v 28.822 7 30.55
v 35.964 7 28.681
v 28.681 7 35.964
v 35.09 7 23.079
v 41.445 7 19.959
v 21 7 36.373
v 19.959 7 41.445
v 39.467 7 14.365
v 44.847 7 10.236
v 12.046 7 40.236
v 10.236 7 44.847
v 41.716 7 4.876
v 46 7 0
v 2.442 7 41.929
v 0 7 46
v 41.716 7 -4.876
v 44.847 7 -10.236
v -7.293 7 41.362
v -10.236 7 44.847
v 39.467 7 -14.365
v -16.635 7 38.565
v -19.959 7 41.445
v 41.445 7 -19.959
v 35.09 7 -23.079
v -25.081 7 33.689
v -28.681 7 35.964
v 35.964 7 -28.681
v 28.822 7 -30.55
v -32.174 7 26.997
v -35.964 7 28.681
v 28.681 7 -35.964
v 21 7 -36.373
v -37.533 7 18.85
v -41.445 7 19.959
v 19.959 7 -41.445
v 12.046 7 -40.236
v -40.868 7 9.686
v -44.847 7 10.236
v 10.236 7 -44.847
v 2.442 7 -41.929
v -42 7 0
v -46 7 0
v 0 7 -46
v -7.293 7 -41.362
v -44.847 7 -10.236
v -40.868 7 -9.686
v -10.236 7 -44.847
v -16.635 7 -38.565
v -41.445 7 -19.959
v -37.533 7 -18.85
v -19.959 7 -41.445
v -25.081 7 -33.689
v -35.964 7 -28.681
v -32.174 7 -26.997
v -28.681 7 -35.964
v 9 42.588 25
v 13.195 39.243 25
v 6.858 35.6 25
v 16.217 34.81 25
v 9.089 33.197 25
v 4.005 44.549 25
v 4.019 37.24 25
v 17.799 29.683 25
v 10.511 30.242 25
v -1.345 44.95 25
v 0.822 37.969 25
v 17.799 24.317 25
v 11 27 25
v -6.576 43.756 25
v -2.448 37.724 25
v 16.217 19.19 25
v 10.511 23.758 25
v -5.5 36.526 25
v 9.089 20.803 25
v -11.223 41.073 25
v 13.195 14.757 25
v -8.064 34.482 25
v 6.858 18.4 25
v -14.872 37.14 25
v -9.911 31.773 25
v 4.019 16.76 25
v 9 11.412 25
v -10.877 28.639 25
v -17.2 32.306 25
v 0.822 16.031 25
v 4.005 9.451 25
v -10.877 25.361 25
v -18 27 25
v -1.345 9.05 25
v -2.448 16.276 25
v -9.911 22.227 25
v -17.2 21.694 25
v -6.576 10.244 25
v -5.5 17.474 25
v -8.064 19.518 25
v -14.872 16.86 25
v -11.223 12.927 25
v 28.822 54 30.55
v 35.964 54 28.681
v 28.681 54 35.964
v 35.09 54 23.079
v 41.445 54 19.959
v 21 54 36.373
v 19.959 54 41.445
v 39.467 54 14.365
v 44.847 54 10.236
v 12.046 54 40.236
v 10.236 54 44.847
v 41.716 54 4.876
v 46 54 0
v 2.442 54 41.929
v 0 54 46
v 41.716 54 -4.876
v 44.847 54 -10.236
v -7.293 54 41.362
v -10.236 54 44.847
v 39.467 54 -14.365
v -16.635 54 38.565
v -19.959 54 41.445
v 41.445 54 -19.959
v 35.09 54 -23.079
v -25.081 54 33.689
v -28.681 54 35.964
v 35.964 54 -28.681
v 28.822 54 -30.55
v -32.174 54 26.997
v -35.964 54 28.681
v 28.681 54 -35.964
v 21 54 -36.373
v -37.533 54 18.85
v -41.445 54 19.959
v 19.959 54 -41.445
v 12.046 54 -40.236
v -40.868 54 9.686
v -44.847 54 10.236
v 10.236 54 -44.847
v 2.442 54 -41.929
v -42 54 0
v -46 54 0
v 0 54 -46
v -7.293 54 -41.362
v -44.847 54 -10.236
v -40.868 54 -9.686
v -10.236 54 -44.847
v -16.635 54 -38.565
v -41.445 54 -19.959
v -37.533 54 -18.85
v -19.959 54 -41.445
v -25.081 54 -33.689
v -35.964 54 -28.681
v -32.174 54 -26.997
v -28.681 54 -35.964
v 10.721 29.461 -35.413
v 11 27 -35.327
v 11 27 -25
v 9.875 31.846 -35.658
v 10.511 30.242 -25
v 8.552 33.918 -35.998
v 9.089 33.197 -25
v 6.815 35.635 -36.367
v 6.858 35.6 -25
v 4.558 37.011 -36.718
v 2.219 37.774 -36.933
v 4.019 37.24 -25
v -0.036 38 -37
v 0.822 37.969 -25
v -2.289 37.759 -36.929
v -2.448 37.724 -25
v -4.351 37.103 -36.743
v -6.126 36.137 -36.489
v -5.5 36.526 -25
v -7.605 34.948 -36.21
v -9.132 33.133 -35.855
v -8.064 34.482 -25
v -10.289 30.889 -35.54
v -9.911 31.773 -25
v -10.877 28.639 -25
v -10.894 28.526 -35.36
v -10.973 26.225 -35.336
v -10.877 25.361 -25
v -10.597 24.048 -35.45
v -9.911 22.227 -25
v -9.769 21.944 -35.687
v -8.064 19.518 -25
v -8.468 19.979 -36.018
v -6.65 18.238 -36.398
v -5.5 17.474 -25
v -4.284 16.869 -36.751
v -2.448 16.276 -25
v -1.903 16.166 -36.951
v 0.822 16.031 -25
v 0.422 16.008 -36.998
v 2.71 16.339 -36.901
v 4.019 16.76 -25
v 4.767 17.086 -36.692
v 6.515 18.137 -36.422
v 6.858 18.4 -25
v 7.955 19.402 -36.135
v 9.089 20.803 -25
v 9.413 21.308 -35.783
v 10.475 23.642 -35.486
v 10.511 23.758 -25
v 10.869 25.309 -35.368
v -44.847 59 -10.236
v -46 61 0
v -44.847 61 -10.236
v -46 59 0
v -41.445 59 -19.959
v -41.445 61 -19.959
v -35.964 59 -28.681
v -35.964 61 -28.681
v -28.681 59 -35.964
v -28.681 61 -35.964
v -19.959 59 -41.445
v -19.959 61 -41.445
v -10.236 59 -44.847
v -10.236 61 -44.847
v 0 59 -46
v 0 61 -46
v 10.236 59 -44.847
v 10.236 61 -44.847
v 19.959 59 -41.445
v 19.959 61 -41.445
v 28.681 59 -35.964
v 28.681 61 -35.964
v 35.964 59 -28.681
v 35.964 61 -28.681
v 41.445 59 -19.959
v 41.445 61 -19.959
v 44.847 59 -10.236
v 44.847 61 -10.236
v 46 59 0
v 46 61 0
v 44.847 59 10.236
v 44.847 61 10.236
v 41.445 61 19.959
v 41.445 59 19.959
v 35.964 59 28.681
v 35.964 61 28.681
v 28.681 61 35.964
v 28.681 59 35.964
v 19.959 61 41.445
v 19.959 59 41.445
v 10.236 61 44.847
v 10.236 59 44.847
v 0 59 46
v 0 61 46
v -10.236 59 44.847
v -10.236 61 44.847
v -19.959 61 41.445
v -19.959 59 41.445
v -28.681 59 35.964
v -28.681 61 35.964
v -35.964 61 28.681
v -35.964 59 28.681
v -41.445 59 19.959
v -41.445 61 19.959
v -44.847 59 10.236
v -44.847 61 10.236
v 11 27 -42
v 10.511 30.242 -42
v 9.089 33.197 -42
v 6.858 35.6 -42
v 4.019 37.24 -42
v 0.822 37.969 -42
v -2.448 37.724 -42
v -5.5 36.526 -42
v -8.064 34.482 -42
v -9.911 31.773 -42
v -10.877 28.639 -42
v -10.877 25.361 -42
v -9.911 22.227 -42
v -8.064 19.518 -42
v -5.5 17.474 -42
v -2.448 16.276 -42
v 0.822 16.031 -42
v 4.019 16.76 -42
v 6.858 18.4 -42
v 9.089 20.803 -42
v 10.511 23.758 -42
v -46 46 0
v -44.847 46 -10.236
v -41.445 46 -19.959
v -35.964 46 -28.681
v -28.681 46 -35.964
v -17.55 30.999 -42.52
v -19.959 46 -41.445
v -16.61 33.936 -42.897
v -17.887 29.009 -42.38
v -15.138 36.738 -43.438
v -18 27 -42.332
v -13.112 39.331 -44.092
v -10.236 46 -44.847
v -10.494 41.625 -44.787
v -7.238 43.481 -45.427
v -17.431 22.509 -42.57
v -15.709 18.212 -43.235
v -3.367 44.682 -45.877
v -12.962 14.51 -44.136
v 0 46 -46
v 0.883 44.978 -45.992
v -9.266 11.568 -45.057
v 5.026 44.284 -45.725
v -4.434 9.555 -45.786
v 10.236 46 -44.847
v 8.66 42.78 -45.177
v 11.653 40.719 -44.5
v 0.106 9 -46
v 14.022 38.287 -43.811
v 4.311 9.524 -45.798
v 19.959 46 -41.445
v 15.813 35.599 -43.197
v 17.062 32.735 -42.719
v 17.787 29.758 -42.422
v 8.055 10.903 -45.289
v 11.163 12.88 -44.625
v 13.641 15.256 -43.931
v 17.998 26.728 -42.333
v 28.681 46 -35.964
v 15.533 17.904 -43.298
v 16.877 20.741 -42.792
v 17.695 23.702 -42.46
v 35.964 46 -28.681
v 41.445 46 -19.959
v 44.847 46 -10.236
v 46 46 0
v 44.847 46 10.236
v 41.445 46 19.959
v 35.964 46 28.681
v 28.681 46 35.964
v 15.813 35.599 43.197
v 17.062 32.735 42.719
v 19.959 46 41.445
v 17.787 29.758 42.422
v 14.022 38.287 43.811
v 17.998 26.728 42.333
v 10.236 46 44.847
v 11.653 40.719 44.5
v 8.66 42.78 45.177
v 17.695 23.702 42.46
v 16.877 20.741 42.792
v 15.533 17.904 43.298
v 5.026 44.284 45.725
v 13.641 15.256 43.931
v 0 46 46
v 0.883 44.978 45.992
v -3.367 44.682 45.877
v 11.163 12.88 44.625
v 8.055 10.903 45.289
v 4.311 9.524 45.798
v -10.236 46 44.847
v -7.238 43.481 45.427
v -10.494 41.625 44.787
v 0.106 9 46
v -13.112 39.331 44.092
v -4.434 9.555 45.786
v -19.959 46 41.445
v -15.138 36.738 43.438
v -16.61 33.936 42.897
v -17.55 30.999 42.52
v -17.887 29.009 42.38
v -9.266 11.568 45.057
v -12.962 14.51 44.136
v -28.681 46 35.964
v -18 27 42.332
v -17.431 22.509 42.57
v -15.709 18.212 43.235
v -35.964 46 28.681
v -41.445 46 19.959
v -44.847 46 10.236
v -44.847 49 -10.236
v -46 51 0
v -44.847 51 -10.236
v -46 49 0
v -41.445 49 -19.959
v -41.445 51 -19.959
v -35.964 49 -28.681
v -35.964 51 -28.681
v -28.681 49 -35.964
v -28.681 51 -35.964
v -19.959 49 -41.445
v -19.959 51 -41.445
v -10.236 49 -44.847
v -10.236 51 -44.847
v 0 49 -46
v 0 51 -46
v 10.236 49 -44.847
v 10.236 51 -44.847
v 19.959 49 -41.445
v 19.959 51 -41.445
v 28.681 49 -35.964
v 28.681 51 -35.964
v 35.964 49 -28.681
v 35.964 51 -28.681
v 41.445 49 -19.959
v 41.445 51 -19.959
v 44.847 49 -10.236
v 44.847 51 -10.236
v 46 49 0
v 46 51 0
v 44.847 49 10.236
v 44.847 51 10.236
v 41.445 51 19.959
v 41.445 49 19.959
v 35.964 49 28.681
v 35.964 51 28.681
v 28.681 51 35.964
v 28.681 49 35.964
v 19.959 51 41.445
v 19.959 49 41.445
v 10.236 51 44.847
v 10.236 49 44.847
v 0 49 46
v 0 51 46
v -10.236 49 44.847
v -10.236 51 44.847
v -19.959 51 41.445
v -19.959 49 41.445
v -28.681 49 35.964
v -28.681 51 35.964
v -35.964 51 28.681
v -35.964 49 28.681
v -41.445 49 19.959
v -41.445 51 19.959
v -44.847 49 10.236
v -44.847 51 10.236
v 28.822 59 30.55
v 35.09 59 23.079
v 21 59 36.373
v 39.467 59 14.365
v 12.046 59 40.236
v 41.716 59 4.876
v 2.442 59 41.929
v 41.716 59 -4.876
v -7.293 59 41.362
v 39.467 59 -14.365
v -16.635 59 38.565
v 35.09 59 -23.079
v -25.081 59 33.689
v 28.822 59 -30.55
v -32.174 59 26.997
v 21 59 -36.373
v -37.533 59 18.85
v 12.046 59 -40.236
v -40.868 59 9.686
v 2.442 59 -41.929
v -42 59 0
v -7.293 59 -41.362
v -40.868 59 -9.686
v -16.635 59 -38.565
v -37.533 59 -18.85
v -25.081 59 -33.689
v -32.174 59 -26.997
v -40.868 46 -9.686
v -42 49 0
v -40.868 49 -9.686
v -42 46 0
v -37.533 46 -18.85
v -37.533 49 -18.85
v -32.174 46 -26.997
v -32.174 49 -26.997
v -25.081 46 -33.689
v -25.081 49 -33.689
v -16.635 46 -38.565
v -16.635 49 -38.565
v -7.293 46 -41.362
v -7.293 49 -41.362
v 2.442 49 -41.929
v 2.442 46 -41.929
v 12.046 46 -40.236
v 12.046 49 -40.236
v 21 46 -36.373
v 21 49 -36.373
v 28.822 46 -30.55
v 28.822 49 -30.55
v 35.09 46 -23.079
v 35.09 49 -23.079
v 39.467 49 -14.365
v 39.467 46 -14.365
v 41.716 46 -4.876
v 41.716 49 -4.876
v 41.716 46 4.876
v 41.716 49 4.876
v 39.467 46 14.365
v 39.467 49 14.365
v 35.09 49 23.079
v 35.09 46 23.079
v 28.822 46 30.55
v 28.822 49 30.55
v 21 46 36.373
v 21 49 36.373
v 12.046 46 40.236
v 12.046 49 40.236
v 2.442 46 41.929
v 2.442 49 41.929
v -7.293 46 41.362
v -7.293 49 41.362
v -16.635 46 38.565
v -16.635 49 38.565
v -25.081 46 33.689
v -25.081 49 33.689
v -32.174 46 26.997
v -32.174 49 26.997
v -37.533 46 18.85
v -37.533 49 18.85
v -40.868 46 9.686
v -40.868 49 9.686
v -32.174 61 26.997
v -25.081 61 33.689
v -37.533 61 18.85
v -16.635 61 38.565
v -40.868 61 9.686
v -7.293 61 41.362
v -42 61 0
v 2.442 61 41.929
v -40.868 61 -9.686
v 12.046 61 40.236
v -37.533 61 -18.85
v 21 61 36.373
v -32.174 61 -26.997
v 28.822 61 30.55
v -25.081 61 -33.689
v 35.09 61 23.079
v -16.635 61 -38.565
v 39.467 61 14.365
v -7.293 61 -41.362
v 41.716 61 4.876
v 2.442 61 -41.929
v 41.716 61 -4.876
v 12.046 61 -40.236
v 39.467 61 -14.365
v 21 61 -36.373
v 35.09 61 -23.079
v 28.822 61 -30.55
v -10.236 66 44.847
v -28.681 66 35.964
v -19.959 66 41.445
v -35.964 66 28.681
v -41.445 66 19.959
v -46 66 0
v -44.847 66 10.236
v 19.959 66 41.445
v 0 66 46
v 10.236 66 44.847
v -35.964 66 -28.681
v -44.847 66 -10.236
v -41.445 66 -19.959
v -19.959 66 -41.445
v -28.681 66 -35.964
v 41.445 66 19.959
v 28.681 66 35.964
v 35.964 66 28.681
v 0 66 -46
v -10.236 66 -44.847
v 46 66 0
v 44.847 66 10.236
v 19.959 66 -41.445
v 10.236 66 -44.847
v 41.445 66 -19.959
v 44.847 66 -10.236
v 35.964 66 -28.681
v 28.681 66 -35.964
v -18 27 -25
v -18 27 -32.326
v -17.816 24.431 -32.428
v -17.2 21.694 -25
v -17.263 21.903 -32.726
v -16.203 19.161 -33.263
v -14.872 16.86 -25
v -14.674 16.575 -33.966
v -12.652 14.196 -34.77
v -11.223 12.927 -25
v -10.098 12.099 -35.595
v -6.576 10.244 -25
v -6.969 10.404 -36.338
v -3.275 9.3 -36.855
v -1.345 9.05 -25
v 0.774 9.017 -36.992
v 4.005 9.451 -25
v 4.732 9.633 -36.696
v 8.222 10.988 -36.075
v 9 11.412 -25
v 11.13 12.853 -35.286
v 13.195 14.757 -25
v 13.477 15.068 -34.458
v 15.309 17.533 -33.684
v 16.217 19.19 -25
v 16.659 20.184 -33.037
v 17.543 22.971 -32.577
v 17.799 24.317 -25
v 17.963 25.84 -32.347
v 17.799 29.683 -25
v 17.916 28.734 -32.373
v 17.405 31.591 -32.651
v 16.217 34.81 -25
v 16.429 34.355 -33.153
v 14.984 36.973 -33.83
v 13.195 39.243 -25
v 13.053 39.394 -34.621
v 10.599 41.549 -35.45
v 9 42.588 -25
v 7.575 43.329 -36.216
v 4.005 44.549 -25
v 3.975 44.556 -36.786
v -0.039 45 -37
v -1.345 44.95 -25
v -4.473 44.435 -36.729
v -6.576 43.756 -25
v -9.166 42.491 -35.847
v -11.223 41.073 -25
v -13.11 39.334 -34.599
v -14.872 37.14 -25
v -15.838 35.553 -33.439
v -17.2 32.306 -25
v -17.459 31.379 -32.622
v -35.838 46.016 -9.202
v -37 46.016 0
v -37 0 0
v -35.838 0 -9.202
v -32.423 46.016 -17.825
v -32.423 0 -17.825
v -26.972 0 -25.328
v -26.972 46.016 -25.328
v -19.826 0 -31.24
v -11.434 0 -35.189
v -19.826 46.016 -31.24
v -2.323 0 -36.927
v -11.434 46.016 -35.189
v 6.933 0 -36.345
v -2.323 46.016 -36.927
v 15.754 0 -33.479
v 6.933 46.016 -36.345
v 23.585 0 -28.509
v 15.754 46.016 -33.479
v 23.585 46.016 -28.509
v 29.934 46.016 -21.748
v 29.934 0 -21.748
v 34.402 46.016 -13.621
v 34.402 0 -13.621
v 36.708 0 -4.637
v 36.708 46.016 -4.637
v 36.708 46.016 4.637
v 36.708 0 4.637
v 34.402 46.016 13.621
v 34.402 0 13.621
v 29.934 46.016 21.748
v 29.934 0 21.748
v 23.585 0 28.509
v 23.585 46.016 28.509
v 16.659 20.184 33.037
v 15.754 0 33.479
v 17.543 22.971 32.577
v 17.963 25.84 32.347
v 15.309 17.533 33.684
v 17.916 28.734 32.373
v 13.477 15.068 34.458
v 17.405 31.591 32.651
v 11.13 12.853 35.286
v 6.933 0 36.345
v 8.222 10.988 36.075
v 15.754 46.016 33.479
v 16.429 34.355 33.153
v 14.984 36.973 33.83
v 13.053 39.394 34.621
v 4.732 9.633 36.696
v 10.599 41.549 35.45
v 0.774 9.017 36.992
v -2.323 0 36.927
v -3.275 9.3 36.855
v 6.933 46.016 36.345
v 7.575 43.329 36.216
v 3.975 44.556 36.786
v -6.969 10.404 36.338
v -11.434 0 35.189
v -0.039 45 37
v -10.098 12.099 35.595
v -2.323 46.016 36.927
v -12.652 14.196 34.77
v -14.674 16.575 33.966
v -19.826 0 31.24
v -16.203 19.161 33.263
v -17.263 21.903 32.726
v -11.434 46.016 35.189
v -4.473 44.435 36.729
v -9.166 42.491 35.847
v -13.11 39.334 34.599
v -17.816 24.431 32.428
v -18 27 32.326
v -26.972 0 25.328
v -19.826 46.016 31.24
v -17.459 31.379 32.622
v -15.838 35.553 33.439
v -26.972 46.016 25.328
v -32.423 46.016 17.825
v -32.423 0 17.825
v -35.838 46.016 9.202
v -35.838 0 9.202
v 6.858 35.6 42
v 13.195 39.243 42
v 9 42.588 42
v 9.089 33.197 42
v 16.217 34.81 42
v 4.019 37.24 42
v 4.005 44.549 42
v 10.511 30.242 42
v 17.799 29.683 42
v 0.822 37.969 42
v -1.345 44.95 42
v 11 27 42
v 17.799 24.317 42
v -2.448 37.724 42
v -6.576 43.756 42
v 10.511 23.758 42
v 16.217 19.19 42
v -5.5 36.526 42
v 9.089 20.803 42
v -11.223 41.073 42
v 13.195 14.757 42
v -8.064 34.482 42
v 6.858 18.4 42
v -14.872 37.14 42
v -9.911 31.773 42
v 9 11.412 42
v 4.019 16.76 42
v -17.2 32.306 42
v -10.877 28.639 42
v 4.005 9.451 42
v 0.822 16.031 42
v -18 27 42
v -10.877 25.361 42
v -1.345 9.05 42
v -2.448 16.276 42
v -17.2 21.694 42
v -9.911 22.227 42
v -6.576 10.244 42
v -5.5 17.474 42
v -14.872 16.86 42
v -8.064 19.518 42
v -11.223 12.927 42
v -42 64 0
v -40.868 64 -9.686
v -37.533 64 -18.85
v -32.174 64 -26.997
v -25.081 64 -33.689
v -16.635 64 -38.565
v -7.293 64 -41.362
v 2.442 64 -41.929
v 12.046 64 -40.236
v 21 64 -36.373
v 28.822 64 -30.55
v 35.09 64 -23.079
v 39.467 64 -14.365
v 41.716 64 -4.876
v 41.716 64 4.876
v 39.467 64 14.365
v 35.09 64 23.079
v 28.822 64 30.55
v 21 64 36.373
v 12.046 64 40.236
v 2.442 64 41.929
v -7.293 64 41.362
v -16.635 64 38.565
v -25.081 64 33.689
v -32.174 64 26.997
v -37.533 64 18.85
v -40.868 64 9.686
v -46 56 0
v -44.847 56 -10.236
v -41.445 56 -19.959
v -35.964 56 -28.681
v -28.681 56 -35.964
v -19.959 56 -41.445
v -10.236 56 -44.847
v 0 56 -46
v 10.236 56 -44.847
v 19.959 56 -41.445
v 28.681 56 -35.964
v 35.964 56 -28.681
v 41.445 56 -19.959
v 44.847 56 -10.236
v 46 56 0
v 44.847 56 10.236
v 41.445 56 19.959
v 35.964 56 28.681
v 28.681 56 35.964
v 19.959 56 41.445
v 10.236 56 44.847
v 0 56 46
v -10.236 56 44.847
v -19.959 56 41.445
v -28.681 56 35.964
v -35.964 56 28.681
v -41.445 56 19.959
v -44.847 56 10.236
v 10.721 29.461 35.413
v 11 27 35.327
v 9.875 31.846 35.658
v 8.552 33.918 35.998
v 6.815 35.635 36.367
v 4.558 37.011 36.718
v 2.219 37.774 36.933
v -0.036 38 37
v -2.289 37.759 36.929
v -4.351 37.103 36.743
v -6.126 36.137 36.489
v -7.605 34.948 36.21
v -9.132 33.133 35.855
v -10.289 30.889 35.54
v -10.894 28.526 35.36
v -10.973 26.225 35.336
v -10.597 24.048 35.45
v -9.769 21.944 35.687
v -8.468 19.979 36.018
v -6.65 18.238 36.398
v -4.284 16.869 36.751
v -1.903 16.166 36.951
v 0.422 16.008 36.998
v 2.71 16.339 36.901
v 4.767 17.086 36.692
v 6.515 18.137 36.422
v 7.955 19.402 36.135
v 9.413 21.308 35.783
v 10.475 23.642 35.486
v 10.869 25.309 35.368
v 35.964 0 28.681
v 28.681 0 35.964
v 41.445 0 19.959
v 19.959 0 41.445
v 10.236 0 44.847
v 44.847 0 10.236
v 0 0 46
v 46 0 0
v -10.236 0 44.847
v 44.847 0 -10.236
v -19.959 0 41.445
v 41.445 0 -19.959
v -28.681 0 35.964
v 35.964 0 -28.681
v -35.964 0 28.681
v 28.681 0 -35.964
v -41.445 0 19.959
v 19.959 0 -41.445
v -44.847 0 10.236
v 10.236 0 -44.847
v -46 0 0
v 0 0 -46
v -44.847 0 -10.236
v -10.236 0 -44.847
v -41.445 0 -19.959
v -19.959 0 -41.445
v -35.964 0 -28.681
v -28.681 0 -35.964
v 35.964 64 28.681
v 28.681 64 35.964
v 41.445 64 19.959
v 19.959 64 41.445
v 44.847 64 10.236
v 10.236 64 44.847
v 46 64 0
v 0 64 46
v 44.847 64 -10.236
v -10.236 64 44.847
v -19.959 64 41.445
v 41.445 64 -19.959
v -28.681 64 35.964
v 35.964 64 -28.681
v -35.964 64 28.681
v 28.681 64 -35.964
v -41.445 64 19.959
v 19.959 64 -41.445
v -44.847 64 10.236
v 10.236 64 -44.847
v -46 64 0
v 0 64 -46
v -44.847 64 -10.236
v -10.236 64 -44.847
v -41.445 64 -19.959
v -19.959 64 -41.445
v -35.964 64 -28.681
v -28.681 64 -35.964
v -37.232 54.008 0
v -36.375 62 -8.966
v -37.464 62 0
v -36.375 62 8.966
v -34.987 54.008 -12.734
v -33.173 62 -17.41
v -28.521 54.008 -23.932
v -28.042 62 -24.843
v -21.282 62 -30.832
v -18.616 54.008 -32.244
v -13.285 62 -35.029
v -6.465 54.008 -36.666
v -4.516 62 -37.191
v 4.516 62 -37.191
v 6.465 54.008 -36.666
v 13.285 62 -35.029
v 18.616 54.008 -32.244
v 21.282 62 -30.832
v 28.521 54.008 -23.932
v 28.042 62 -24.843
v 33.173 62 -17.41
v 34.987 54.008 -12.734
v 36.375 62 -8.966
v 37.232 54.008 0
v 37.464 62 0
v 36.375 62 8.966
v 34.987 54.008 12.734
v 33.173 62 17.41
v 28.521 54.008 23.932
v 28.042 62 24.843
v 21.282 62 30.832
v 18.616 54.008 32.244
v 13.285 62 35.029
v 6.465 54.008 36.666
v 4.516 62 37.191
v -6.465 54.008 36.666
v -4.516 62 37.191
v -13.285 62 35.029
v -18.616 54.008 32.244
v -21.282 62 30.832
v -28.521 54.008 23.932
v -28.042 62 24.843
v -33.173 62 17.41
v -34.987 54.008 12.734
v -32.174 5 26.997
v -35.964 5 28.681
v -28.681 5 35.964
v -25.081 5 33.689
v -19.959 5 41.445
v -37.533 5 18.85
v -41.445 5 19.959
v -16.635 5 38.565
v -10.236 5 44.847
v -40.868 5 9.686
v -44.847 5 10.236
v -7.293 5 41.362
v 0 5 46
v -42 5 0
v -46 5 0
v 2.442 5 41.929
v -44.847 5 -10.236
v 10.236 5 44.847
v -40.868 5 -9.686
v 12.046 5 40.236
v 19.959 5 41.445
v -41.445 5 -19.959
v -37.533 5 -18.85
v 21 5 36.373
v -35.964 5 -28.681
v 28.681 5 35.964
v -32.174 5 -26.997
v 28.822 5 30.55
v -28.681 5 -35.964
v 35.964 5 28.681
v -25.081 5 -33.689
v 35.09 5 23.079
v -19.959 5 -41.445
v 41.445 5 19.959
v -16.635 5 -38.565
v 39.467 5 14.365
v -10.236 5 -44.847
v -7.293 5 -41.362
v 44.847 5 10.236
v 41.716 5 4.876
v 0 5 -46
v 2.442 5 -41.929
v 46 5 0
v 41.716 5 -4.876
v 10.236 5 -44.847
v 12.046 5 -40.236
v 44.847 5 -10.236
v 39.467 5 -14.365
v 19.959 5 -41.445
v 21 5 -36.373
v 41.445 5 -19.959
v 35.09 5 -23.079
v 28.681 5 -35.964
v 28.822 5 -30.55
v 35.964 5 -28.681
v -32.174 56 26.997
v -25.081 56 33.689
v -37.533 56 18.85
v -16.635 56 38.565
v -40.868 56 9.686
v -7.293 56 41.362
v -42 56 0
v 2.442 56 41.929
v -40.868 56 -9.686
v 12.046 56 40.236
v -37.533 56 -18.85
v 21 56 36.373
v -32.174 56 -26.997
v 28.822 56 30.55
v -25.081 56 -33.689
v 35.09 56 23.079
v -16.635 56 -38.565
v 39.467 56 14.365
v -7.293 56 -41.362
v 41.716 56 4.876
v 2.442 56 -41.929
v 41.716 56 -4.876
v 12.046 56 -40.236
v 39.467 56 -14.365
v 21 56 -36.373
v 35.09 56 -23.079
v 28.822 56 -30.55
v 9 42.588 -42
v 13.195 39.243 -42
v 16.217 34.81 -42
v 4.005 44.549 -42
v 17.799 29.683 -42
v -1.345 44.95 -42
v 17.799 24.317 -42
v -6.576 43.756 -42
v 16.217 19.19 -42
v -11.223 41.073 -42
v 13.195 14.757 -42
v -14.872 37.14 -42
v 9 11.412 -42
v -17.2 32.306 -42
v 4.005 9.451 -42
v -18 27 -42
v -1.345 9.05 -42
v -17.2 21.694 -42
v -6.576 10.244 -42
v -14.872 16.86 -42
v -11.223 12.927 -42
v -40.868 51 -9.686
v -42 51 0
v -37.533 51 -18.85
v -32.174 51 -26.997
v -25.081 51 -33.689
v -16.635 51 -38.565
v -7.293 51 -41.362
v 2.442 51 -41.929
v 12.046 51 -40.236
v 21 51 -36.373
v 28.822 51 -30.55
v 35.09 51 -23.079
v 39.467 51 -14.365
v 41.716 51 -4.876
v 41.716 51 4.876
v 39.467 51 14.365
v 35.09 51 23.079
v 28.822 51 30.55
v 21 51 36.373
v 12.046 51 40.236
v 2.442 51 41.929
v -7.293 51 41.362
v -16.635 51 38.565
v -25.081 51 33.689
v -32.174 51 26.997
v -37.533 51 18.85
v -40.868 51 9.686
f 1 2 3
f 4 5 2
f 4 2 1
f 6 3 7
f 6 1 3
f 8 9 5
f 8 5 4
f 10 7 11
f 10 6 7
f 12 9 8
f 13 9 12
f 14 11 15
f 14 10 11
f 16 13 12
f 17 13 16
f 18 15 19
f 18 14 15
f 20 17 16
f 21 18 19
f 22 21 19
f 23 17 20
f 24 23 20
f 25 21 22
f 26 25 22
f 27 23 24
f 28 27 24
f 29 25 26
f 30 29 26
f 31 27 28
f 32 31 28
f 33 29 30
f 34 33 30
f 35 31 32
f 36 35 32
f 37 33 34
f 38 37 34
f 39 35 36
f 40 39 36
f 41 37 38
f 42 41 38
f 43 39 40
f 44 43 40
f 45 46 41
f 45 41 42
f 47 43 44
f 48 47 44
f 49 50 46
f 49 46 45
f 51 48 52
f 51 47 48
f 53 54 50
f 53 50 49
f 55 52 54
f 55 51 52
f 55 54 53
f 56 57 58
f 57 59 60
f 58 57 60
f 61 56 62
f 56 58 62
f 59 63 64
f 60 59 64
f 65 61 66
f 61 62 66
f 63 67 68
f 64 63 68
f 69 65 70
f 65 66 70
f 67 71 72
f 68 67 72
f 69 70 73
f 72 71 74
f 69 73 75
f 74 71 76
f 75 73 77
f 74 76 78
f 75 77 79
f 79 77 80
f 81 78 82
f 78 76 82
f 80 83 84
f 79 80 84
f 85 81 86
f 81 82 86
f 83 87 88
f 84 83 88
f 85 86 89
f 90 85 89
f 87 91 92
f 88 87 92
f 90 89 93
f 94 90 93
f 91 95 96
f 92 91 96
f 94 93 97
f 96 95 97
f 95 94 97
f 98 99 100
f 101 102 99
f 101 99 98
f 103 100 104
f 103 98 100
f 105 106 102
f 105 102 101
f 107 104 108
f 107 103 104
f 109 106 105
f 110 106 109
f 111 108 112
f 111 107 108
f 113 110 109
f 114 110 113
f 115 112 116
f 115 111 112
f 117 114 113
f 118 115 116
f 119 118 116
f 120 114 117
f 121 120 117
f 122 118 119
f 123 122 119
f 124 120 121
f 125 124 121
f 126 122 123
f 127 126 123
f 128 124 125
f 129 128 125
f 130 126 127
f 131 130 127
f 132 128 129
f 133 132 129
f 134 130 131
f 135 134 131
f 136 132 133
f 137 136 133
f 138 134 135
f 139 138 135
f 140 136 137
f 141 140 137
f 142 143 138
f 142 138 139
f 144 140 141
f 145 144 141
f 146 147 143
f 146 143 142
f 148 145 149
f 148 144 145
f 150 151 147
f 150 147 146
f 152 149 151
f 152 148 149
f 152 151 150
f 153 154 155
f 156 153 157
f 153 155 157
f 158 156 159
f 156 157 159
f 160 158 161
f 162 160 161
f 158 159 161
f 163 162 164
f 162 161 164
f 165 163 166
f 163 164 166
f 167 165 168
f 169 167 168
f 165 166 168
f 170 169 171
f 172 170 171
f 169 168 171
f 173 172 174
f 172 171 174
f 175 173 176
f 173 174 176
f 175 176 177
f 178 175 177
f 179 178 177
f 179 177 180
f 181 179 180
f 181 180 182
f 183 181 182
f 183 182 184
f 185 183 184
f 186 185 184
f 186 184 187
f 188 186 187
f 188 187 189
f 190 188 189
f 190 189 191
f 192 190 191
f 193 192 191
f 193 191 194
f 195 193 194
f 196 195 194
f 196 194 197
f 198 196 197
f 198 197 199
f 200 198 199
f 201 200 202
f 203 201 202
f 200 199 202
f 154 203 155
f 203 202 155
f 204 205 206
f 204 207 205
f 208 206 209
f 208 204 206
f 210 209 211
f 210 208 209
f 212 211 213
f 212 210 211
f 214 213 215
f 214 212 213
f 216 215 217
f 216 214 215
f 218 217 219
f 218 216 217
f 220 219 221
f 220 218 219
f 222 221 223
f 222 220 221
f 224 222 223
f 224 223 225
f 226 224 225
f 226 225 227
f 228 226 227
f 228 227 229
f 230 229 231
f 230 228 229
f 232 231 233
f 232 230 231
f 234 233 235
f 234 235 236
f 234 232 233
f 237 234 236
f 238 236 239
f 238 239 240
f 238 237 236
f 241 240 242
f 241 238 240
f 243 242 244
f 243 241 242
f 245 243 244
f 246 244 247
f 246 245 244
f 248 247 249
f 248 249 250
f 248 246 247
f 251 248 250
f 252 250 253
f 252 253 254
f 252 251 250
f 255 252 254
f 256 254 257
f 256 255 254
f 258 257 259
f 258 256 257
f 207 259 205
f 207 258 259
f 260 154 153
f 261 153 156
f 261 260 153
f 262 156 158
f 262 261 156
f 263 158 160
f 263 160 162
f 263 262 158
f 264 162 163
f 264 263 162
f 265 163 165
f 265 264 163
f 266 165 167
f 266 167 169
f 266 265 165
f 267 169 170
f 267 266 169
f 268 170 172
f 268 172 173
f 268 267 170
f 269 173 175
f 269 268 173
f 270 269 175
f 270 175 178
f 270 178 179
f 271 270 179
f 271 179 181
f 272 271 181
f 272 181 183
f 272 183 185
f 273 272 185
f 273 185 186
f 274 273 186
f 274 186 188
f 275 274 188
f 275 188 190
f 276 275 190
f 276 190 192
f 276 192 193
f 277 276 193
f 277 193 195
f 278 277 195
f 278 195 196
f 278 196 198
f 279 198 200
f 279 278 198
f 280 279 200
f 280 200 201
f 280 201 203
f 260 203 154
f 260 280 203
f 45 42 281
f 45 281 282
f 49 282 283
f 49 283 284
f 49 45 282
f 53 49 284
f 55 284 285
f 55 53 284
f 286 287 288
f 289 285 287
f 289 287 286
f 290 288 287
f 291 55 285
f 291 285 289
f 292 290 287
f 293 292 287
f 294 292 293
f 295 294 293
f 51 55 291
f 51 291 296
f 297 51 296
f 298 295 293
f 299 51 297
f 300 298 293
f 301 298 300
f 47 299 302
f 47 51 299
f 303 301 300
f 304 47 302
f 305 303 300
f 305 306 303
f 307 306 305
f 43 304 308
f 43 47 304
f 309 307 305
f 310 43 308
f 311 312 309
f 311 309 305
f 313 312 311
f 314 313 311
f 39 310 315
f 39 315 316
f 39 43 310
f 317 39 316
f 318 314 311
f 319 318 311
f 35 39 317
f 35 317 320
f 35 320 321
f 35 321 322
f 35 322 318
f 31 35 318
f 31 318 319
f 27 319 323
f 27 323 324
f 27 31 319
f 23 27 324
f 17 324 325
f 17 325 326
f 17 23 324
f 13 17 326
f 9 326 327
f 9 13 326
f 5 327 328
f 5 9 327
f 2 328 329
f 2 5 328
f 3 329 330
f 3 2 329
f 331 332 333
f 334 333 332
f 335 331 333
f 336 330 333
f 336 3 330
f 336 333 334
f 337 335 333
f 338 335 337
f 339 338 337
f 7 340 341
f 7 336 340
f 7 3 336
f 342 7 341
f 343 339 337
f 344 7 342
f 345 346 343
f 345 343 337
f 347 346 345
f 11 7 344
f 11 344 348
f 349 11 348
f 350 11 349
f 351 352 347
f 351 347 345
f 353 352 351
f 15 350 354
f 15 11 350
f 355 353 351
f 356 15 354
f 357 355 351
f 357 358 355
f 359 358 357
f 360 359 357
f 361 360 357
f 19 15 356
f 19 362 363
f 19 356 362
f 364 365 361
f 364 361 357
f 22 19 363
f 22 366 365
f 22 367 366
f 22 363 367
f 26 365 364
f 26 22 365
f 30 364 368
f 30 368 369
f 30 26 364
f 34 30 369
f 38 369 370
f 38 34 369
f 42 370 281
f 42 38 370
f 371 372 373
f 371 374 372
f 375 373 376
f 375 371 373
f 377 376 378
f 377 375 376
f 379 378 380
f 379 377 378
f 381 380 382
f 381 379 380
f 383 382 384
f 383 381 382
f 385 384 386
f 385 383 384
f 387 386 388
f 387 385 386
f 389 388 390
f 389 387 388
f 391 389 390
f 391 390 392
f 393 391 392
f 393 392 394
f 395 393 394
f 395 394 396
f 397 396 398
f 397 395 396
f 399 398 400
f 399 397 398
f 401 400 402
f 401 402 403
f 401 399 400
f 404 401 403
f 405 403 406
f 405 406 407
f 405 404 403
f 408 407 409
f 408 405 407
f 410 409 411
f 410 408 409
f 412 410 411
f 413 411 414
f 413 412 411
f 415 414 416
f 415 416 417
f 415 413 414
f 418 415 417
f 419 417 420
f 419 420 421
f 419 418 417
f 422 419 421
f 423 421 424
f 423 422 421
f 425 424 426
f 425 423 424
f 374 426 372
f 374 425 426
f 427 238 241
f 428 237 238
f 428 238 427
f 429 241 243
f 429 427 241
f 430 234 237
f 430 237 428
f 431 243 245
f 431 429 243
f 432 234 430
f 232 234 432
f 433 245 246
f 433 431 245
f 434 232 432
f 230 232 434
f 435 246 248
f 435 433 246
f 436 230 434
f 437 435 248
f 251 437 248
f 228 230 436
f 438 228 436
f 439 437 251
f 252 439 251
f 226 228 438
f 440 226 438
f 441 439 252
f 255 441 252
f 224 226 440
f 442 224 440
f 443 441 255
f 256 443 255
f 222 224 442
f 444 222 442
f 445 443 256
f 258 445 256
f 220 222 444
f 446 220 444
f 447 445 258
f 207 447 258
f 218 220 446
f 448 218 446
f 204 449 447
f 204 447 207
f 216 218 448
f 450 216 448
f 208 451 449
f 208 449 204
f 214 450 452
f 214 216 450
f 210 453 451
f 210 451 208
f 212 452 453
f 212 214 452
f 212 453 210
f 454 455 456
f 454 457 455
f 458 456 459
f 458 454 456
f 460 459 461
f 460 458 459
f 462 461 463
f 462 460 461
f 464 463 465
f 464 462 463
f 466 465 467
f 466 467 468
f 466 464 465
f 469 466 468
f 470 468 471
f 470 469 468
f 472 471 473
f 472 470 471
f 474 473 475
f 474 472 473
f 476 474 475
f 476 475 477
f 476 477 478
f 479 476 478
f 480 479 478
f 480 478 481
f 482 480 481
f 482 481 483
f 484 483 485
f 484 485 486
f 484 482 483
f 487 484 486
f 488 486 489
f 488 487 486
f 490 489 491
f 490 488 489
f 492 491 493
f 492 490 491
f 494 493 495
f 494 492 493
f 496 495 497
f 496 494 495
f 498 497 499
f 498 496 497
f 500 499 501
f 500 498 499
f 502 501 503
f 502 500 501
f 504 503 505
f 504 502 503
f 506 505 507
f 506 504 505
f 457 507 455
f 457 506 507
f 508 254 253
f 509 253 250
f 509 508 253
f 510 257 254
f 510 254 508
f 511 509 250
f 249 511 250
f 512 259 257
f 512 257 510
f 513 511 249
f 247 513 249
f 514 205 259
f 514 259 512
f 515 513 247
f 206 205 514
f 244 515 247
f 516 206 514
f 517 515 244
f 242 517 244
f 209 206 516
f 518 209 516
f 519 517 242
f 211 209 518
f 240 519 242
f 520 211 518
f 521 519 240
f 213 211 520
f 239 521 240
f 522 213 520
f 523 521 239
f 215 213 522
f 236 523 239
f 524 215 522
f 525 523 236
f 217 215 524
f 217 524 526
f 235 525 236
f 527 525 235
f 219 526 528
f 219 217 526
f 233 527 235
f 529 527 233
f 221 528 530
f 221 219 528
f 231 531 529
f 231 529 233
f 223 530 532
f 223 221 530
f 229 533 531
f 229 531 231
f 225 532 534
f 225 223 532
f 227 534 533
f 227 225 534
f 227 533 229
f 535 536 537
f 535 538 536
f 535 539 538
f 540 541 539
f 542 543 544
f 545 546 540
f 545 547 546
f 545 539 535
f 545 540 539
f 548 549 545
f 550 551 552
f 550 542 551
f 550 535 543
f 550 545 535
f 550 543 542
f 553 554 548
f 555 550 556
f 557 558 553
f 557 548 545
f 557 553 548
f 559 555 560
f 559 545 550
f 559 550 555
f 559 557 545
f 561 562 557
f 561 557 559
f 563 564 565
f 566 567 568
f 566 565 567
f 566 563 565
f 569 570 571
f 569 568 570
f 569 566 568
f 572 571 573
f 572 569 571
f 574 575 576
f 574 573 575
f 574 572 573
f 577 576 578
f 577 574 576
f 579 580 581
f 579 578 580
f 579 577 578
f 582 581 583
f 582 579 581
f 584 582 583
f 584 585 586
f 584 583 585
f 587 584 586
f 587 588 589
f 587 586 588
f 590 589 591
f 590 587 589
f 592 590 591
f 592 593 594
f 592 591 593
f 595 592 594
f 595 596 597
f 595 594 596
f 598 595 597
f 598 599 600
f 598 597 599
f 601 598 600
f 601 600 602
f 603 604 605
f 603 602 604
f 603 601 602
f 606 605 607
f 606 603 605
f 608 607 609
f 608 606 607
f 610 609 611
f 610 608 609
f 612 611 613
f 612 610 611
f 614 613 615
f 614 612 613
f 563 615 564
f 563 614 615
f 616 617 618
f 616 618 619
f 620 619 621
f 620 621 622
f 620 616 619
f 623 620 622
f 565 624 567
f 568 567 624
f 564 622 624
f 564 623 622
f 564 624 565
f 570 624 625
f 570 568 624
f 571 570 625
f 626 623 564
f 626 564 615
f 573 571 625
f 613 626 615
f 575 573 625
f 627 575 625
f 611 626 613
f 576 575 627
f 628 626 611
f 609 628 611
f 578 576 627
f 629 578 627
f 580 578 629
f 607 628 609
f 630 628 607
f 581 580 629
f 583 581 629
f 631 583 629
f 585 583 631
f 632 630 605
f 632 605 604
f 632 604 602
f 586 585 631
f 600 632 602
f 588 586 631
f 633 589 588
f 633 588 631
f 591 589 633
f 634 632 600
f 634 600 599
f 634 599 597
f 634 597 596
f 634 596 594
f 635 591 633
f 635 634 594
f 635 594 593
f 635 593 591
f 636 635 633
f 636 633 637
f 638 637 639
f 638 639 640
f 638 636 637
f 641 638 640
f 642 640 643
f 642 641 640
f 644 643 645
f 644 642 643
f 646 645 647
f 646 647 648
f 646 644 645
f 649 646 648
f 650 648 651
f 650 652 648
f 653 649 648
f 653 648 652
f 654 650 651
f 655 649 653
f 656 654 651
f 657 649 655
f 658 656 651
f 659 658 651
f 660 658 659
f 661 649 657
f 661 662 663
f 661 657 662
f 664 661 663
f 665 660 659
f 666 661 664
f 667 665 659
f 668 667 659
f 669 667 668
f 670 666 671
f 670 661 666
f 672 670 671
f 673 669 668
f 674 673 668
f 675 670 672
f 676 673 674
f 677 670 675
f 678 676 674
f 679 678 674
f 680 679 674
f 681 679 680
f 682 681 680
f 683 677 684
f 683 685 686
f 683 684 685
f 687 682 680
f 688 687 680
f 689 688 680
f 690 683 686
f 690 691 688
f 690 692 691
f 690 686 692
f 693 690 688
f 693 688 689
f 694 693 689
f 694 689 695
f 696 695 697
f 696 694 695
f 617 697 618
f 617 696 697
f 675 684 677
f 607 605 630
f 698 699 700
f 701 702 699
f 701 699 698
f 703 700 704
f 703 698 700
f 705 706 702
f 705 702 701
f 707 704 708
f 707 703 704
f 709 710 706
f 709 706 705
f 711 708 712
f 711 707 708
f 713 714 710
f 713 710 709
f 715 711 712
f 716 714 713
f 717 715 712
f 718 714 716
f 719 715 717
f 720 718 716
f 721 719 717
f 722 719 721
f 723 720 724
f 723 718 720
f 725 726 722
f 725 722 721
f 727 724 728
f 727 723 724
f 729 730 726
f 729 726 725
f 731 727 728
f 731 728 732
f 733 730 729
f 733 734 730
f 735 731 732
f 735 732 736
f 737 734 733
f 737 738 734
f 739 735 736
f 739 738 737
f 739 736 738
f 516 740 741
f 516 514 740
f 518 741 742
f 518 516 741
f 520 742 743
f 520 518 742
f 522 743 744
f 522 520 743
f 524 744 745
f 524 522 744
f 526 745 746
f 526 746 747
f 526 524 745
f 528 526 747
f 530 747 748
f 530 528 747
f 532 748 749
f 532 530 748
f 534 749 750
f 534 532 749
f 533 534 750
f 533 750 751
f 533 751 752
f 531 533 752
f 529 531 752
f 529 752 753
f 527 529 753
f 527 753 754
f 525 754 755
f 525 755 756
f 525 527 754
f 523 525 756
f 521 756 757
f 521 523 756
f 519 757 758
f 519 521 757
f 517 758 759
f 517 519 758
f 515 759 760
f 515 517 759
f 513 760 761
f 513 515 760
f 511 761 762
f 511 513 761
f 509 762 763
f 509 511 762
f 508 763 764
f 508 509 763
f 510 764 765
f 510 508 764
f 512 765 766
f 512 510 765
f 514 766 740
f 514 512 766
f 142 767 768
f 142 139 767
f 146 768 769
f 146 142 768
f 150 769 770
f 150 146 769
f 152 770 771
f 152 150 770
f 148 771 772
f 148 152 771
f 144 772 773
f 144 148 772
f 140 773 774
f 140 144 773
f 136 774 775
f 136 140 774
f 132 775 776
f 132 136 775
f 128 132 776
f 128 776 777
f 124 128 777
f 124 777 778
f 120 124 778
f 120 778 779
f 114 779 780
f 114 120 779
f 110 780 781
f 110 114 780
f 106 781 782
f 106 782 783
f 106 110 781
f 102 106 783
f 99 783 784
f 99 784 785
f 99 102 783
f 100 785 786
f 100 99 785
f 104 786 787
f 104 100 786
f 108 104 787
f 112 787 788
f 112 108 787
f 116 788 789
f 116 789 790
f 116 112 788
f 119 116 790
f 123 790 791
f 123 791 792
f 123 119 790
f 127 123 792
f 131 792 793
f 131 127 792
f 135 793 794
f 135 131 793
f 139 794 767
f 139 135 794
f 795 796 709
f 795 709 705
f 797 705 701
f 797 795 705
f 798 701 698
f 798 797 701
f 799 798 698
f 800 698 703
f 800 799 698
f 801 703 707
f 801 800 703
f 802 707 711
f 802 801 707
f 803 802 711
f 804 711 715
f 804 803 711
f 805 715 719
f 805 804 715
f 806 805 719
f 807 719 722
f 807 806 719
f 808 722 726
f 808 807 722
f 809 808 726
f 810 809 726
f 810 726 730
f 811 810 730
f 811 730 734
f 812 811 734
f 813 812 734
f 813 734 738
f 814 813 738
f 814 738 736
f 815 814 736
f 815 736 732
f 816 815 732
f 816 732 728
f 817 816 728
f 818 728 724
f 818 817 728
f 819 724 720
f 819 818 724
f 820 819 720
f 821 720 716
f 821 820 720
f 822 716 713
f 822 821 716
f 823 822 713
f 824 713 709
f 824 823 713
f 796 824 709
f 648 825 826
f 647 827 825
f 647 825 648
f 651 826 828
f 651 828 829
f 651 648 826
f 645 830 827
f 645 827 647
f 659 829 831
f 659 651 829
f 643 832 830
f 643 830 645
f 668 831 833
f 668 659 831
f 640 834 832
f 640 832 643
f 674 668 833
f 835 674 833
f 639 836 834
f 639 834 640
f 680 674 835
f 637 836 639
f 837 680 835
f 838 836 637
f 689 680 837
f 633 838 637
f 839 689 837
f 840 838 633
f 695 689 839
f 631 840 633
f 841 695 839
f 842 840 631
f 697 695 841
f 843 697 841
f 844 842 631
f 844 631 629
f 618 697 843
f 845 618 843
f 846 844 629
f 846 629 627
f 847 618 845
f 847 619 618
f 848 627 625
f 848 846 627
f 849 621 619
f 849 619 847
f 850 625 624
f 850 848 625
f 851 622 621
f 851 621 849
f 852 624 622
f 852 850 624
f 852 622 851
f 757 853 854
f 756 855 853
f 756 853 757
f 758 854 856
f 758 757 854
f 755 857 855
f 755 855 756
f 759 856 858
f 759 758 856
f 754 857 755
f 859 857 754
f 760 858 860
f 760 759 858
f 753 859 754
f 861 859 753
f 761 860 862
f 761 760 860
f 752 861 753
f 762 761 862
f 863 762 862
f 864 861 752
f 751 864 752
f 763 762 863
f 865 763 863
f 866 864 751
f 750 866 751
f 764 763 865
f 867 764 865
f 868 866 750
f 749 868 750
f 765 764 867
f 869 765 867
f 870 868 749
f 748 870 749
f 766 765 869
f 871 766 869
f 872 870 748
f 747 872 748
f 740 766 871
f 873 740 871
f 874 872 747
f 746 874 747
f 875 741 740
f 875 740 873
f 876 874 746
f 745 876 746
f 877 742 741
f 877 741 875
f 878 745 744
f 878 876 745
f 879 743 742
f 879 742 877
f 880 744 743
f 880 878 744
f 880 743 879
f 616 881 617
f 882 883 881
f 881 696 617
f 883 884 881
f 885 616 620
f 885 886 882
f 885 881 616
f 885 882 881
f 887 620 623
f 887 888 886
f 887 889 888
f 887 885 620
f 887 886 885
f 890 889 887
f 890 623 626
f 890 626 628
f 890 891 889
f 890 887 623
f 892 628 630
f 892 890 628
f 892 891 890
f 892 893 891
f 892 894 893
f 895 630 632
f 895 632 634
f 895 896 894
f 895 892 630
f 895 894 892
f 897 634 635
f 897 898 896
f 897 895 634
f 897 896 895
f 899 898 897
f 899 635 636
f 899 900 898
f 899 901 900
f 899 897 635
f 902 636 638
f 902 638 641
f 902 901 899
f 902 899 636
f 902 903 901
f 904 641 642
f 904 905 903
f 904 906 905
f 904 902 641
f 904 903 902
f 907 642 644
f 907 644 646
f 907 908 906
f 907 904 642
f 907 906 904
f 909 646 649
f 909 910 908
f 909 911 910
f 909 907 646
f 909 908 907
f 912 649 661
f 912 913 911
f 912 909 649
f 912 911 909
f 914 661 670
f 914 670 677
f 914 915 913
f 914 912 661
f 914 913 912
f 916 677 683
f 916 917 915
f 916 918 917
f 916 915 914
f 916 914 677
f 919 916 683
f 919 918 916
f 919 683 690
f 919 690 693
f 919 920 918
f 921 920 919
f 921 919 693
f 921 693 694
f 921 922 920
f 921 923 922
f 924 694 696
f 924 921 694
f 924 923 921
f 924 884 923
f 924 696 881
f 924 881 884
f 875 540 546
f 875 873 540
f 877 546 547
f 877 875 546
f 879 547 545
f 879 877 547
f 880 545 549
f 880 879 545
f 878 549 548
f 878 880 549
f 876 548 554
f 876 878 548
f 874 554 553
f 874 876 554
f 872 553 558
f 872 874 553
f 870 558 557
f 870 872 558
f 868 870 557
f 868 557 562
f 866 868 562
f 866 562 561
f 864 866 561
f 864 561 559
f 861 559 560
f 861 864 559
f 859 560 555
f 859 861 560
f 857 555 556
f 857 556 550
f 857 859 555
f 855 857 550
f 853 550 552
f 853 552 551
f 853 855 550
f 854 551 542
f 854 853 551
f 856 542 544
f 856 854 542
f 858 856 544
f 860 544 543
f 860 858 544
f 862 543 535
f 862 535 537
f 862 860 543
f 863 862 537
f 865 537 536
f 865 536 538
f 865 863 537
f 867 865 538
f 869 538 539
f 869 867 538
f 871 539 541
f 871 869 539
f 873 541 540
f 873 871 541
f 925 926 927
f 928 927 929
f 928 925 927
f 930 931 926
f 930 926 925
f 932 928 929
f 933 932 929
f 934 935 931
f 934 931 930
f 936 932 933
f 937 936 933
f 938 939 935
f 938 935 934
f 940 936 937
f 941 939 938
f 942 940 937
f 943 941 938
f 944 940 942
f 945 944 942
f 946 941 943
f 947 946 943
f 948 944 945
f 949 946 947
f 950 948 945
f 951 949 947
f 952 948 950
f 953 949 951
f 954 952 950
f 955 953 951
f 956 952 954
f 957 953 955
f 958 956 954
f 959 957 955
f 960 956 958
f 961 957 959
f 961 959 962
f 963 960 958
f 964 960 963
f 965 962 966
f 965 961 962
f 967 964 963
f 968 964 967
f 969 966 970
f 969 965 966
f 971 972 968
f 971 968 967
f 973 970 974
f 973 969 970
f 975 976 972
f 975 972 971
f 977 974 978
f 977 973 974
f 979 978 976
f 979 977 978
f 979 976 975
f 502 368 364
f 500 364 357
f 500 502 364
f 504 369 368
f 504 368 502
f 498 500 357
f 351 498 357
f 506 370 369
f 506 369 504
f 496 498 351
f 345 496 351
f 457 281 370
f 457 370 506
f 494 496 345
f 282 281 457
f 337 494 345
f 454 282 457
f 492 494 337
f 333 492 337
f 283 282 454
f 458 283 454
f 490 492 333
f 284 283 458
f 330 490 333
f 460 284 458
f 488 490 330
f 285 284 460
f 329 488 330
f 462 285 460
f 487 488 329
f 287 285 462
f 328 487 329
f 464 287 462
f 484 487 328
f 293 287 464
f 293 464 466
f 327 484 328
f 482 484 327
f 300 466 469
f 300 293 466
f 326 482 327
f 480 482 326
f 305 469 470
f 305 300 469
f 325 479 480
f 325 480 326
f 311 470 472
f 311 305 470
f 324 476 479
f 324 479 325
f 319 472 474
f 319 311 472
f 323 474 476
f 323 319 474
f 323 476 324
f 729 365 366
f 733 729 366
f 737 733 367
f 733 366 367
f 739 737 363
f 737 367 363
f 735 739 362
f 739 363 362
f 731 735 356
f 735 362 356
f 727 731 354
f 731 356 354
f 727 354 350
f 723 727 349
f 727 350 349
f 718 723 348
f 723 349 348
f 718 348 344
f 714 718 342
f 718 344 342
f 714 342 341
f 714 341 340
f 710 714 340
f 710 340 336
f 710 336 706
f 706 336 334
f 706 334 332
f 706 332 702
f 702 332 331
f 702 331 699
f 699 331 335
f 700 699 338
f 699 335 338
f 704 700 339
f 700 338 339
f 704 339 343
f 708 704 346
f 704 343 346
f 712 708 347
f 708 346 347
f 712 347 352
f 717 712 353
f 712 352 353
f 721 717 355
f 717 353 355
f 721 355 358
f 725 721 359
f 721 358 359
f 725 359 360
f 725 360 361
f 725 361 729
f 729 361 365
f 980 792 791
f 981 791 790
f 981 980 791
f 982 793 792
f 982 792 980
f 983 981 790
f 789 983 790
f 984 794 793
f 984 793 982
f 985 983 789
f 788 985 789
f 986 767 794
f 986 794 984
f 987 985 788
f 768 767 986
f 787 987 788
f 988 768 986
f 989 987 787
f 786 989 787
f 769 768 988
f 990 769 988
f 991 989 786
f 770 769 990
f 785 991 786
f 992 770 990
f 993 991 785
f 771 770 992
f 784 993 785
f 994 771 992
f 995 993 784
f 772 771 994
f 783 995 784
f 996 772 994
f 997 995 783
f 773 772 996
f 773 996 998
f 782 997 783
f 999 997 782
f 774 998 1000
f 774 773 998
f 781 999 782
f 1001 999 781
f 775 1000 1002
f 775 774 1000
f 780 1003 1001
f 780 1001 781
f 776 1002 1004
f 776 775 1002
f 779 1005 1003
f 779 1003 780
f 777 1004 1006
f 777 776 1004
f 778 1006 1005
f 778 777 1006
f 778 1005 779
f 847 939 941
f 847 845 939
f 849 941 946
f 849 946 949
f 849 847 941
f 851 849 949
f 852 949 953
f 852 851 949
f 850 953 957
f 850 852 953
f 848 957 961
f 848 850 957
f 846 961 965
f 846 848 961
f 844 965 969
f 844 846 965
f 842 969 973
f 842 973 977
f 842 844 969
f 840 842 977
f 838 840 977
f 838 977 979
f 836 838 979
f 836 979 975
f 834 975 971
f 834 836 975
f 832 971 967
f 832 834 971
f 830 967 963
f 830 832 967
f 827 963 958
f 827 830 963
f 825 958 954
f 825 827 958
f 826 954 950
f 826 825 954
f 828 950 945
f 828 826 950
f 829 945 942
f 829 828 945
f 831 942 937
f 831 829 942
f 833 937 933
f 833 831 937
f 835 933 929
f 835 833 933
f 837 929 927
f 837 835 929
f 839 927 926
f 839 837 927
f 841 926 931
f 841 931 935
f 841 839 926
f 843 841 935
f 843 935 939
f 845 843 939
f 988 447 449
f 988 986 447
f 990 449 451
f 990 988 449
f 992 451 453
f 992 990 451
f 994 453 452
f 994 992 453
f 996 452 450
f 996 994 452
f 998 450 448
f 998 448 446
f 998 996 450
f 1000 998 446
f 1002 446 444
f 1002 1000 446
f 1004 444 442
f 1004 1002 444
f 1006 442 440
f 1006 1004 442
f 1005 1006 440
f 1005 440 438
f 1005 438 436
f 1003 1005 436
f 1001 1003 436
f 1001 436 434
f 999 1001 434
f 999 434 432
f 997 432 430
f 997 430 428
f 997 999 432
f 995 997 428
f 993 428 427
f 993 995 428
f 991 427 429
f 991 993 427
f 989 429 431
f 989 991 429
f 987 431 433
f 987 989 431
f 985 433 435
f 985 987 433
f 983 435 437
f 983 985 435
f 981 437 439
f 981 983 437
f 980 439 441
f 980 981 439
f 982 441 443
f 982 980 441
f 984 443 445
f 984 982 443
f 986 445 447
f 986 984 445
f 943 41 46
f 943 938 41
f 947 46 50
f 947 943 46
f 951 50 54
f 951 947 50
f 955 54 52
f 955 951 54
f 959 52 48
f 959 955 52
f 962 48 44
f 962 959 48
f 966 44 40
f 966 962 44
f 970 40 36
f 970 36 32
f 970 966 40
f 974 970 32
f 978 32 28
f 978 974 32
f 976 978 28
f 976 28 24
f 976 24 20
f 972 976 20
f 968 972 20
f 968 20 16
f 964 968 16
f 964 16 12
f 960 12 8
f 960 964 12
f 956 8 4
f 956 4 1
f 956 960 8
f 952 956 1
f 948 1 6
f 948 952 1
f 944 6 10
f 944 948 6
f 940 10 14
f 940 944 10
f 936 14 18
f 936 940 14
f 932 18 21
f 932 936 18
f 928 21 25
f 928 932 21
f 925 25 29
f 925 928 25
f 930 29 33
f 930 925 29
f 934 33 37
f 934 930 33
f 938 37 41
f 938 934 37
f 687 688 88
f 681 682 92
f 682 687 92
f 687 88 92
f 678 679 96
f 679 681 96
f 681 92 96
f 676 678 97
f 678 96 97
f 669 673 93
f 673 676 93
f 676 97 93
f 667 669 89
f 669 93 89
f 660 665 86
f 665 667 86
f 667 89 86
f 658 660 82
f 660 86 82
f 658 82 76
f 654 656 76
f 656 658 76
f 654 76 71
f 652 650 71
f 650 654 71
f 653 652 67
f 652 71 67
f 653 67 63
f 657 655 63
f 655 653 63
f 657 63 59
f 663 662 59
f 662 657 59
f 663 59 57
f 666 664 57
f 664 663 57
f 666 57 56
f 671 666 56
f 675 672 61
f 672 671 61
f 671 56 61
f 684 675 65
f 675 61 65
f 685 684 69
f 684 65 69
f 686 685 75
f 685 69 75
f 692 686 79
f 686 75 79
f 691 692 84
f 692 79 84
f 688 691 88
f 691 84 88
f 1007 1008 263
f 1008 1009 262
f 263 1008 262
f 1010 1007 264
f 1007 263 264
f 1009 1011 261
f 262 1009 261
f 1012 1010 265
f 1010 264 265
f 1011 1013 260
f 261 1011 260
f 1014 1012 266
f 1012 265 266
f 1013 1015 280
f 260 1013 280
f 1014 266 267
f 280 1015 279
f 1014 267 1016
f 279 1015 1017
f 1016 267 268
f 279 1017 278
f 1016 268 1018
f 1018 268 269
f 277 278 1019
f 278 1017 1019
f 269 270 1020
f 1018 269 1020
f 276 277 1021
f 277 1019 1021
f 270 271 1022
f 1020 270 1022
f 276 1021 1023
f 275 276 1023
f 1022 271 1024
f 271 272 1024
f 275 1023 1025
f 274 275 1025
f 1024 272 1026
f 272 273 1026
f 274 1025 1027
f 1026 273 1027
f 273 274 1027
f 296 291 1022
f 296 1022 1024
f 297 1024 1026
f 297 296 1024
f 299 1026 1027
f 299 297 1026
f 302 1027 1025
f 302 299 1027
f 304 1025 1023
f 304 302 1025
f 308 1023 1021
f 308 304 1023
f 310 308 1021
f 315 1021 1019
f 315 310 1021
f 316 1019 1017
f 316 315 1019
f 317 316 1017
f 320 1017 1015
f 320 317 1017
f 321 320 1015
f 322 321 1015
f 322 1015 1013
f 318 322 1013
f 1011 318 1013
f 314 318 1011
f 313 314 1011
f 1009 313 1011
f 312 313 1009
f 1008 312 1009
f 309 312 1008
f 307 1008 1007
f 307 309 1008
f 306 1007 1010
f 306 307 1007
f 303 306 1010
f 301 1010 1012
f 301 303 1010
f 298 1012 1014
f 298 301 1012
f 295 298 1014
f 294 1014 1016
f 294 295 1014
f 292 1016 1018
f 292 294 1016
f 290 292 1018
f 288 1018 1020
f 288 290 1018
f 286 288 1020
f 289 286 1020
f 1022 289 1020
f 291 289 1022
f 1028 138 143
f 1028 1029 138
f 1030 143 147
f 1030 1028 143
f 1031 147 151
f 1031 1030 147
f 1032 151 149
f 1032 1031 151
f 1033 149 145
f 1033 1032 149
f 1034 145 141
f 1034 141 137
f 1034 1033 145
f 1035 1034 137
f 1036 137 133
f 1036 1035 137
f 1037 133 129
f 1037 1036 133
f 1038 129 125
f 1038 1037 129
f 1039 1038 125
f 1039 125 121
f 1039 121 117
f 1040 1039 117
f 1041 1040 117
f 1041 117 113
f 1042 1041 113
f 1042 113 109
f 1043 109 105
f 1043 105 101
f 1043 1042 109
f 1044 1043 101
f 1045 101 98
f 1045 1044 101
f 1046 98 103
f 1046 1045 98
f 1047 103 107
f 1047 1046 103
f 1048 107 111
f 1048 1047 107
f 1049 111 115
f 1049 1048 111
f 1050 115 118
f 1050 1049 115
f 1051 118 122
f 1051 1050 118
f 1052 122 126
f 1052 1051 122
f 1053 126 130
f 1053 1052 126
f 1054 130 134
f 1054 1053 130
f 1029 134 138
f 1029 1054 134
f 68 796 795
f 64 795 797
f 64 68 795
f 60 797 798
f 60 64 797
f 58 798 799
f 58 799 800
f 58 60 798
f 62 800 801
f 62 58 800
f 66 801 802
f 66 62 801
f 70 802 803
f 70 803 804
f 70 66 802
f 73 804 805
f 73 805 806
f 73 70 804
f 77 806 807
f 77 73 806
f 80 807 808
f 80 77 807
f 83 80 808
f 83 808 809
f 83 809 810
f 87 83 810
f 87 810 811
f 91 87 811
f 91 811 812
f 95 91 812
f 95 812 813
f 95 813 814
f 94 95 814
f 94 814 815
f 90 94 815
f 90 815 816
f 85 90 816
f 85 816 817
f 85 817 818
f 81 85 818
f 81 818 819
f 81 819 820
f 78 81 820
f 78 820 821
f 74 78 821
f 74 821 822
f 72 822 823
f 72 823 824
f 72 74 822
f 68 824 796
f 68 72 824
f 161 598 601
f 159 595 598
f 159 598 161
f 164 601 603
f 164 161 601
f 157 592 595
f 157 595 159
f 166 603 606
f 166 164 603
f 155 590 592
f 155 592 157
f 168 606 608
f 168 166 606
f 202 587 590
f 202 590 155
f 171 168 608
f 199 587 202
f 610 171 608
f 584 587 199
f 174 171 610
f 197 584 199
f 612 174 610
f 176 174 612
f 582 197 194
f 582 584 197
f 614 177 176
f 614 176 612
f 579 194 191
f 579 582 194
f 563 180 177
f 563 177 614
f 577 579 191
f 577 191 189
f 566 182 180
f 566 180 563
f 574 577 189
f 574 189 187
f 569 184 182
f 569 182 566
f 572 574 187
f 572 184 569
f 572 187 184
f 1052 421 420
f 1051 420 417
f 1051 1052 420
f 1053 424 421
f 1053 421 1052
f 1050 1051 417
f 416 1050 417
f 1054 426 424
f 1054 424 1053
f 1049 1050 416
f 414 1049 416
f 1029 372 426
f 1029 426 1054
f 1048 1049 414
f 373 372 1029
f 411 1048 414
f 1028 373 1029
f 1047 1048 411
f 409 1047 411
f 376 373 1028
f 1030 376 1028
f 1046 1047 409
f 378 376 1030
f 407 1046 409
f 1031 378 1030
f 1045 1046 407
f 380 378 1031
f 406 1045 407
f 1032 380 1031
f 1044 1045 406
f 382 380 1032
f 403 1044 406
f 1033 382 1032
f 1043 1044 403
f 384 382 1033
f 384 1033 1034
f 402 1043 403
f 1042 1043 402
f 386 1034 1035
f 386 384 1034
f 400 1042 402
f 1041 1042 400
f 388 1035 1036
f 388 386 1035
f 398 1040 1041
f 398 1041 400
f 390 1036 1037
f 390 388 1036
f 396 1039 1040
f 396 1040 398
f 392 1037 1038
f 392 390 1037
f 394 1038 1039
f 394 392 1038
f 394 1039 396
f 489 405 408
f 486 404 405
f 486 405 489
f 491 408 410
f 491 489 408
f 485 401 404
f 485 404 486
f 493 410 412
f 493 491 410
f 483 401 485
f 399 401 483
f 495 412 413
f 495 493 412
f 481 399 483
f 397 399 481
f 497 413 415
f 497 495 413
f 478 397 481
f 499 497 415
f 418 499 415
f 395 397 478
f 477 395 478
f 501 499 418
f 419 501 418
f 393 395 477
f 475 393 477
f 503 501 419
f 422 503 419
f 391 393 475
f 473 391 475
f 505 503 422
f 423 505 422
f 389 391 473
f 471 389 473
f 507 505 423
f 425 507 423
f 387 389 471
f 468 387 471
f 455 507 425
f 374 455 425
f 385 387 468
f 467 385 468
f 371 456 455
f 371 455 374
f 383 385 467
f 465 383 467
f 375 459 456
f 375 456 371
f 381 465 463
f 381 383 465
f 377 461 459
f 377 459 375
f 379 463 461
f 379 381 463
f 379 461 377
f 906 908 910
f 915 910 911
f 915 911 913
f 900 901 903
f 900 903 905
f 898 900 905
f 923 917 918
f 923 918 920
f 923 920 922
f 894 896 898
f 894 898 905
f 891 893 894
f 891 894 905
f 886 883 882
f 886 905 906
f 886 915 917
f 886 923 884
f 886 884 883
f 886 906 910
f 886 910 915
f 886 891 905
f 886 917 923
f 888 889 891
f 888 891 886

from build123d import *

# Parameters (mm, degrees)
CUT_EXTRUDE1_DEPTH       = 93.671462706
CUT_EXTRUDE1_DEPTH_BACK  = 93.671462706
SKETCH2_R                = 11
CUT_EXTRUDE3_START       = 46
SKETCH3_R                = 18
CUT_EXTRUDE3_DEPTH       = 4
BOSS_EXTRUDE2_REACH      = 119.671
BOSS_EXTRUDE2_END_RADIUS = 37
BOSS_EXTRUDE2_START      = 25
SKETCH6_R                = 18
SKETCH6_R_2              = 11


with BuildPart() as part:
    # Sketch1 → Revolve1 (revolve)
    with BuildSketch(Plane.XY):
        Polygon((0, 66), (-46, 66), (-46, 64), (-42, 64), (-42, 61), (-46, 61), (-46, 59), (-42, 59), (-42, 56), (-46, 56), (-46, 54), (-42, 54), (-42, 51), (-46, 51), (-46, 49), (-42, 49), (-42, 46), (-46, 46), (-46, 7), (-42, 7), (-42, 5), (-46, 5), (-46, 0), (-37, 0), (-37, 7), (-37, 46.016426543), (-37.463954494, 62), (0, 62), align=None)
    revolve(axis=Axis((0, 66, 0), (0, -1, 0)))

    # Sketch2 → Cut-Extrude1 (cut, two sides: drawn at the far end of the back side and taken through both)
    with BuildSketch(Plane.XY.offset(-CUT_EXTRUDE1_DEPTH_BACK)):
        with Locations((0, 27)):
            Circle(SKETCH2_R)
    extrude(amount=CUT_EXTRUDE1_DEPTH + CUT_EXTRUDE1_DEPTH_BACK, mode=Mode.SUBTRACT)

    # Sketch3 → Cut-Extrude3 (cut, symmetric)
    with BuildSketch(Plane.XY.offset(CUT_EXTRUDE3_START)):
        with Locations(Location((0, 27, 0), (0, 0, 180))):
            Circle(SKETCH3_R)
    cut_extrude3 = extrude(amount=CUT_EXTRUDE3_DEPTH, both=True, mode=Mode.SUBTRACT)

    # Mirror2: Cut-Extrude3 across plane
    add(cut_extrude3.mirror(Plane.XY), mode=Mode.SUBTRACT)

    # Boss-Extrude2: up to this cylinder (the profile starts inside it)
    boss_extrude2_end = Plane(origin=(0, 27, 0), z_dir=(0, 1, 0)) * Cylinder(BOSS_EXTRUDE2_END_RADIUS, 314.342, mode=Mode.PRIVATE)
    # Sketch6 → Boss-Extrude2 (add, up to the surface)
    with BuildSketch(Plane.XY.offset(BOSS_EXTRUDE2_START), mode=Mode.PRIVATE) as boss_extrude2_sk1:
        with Locations(Location((0, 27, 0), (0, 0, 180))):
            Circle(SKETCH6_R)
        with Locations((0, 27)):
            Circle(SKETCH6_R_2, mode=Mode.SUBTRACT)
    boss_extrude2_tool1 = extrude(boss_extrude2_sk1.sketch, amount=BOSS_EXTRUDE2_REACH, mode=Mode.PRIVATE) & boss_extrude2_end
    boss_extrude2 = boss_extrude2_tool1.solids().sort_by_distance((17.490883, 27, 25))[0]
    add(boss_extrude2)

    # Mirror4: Boss-Extrude2 across plane
    add(boss_extrude2.mirror(Plane.XY))


solid = part.part
